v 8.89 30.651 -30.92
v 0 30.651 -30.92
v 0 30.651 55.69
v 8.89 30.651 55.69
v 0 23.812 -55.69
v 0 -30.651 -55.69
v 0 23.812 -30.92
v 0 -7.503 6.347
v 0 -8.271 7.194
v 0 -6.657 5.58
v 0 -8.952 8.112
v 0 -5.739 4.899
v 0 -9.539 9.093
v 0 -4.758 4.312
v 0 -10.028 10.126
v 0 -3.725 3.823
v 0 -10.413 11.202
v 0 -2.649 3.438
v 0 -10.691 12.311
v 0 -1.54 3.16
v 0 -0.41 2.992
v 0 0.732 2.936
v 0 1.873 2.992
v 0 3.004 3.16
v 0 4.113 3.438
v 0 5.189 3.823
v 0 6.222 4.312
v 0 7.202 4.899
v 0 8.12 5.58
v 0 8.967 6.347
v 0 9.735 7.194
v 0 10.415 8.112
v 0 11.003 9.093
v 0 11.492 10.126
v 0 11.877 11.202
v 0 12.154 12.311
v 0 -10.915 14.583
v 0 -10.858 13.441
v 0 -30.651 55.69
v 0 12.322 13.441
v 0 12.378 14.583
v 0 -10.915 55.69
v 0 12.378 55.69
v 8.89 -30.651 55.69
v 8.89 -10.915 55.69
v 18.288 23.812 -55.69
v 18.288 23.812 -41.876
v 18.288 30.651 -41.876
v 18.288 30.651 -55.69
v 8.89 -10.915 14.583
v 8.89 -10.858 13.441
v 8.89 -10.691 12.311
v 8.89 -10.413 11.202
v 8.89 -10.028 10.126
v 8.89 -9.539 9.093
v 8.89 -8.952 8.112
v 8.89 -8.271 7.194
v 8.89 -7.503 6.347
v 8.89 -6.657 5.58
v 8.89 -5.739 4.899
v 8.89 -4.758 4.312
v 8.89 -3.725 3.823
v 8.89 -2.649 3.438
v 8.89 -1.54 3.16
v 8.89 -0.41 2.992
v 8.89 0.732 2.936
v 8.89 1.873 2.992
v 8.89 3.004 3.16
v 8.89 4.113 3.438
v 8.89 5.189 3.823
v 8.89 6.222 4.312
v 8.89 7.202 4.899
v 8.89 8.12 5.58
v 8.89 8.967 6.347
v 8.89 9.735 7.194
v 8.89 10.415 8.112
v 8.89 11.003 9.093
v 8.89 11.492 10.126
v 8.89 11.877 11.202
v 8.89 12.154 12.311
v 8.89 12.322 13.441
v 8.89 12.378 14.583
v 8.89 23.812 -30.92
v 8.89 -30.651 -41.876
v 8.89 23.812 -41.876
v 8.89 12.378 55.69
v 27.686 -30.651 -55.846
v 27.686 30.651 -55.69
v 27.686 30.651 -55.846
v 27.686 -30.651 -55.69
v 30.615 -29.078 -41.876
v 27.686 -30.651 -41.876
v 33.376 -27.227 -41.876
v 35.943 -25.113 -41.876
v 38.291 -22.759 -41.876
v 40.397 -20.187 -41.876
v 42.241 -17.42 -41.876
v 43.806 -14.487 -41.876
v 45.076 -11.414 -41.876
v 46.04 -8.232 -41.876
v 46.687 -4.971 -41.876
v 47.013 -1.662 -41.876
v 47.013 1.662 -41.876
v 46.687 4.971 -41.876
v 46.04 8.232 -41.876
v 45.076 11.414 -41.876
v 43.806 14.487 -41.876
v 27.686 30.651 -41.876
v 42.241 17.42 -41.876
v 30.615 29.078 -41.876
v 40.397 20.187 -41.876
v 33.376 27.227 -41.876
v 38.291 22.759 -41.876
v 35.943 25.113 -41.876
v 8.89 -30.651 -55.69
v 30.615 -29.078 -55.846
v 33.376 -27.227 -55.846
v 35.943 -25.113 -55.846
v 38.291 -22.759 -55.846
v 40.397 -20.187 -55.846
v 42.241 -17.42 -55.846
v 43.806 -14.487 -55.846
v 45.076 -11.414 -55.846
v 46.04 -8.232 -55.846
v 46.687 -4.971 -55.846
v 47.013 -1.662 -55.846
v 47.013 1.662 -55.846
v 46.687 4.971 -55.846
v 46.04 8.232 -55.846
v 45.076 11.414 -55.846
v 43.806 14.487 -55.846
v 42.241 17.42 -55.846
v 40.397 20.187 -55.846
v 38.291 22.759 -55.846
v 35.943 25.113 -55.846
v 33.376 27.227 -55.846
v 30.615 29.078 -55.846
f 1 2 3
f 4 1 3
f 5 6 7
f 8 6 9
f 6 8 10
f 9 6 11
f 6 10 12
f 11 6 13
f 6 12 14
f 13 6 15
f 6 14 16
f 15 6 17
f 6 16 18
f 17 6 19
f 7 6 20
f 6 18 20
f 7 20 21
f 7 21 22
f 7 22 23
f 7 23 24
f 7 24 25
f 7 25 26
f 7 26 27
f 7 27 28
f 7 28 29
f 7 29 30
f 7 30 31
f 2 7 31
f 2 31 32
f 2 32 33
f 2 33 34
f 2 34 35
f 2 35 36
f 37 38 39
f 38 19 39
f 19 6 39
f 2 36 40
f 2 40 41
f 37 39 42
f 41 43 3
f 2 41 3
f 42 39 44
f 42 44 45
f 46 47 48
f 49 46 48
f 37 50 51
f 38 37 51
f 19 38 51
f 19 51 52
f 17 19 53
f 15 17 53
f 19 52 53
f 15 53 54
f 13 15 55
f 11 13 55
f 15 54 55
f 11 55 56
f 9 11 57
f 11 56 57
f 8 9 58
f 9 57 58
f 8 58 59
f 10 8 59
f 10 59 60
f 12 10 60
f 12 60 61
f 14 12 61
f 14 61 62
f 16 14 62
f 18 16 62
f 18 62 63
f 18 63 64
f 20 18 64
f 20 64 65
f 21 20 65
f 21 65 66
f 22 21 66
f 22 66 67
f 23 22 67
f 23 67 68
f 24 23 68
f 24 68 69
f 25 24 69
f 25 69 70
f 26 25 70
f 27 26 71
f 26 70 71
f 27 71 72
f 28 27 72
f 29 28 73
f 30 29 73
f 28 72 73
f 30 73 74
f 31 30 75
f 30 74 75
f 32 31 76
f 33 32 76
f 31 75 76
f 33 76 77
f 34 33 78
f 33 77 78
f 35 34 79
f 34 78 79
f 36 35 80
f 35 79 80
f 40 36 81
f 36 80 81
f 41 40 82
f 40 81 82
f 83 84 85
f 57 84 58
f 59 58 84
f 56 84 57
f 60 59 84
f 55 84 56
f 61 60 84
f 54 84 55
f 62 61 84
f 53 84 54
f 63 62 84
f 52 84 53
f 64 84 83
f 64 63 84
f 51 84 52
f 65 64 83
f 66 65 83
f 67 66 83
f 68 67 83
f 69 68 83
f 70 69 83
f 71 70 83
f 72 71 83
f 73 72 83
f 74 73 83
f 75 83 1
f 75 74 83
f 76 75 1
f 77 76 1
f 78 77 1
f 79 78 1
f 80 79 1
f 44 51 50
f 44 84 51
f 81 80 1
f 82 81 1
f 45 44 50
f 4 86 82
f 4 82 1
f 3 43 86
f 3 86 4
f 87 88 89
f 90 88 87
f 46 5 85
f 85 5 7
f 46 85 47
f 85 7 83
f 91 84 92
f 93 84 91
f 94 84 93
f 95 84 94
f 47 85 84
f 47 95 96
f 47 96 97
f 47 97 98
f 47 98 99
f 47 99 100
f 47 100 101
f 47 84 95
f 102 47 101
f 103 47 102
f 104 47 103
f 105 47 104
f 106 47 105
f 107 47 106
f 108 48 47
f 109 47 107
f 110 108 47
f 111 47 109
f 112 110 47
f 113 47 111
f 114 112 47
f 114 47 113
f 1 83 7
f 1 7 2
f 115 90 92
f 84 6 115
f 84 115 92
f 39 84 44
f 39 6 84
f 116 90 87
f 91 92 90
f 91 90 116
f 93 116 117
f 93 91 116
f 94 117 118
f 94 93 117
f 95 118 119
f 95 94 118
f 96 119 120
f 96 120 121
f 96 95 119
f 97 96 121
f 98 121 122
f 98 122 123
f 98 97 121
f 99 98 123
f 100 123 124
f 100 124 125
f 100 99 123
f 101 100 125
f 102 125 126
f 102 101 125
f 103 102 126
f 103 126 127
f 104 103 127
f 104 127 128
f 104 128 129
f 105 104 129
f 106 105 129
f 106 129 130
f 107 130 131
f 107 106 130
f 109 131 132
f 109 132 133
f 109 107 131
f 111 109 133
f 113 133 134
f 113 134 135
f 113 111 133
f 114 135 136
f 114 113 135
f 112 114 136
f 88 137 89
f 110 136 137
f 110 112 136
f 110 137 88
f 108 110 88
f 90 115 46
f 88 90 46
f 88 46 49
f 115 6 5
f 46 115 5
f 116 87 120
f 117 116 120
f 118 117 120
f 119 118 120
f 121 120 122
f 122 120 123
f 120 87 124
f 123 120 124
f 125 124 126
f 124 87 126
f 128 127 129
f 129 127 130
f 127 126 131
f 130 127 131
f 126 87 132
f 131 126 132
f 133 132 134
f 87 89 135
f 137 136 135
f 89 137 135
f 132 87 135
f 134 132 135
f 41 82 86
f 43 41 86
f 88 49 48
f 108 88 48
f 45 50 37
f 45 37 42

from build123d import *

# Parameters (mm, degrees)
F0_W      = 61.3026209176
F0_H      = 111.3808304071
F1_DEPTH  = 8.89
F2_W      = 61.3026209176
F2_H      = 13.814676553
F3_DEPTH  = 18.796
F5_DEPTH  = 13.97
F6_W      = 23.2926858589
F6_H      = 41.1077216268
F7_DEPTH  = 25.4
F9_DEPTH  = 25.4
F10_W     = 6.8394243717
F10_H     = 10.9558589756
F11_DEPTH = 25.4
F12_W     = 8.89
F12_H     = 6.8394243717
F13_DEPTH = 25.4
F14_W     = 9.398
F14_H     = 6.8394243717
F15_DEPTH = 25.4


with BuildPart() as f1:
    # F0 (on Right) → F1 (new body)
    with BuildSketch(Plane.YZ):
        Rectangle(F0_W, F0_H)
    extrude(amount=F1_DEPTH)

    # F2 (on face) → F3 (join)
    with BuildSketch(Plane.YZ.offset(8.89)):
        with Locations((0, -48.7830769271)):
            Rectangle(F2_W, F2_H)
    extrude(amount=F3_DEPTH)

    # F4 (on face) → F5 (join)
    with BuildSketch(Plane.XY.offset(-41.8757386506)):
        with BuildLine():
            Line((27.686, 30.6513104588), (27.686, -30.6513104588))
            ThreePointArc((27.686, -30.6513104588), (47.0533316353, 0), (27.686, 30.6513104588))
        make_face()
    extrude(amount=-F5_DEPTH)

    # F6 (on face) → F7 (cut)
    with BuildSketch(Plane.YZ.offset(8.89)):
        with Locations((0.7317778654, 35.1365543902)):
            Rectangle(F6_W, F6_H)
    extrude(amount=-F7_DEPTH, mode=Mode.SUBTRACT)

    # F8 (on face) → F9 (cut)
    with BuildSketch(Plane.YZ.offset(8.89)):
        with BuildLine():
            Line((12.3781207949, 14.5826935768), (-10.914565064, 14.5826935768))
            ThreePointArc((-10.914565064, 14.5826935768), (0.7317778654, 2.9363506474), (12.3781207949, 14.5826935768))
        make_face()
    extrude(amount=-F9_DEPTH, mode=Mode.SUBTRACT)

    # F10 (on face) → F11 (cut)
    with BuildSketch(Plane.YZ.offset(8.89)):
        with Locations((27.2315982729, -36.3978091627)):
            Rectangle(F10_W, F10_H)
    extrude(amount=-F11_DEPTH, mode=Mode.SUBTRACT)

    # F12 (on face) → F13 (cut)
    with BuildSketch(Plane.XY.offset(-41.8757386506)):
        with Locations((4.445, 27.2315982729)):
            Rectangle(F12_W, F12_H)
    extrude(amount=-F13_DEPTH, mode=Mode.SUBTRACT)

    # F14 (on face) → F15 (cut)
    with BuildSketch(Plane.XY.offset(-41.8757386506)):
        with Locations((13.589, 27.2315982729)):
            Rectangle(F14_W, F14_H)
    extrude(amount=-F15_DEPTH, mode=Mode.SUBTRACT)


solid = f1.part
